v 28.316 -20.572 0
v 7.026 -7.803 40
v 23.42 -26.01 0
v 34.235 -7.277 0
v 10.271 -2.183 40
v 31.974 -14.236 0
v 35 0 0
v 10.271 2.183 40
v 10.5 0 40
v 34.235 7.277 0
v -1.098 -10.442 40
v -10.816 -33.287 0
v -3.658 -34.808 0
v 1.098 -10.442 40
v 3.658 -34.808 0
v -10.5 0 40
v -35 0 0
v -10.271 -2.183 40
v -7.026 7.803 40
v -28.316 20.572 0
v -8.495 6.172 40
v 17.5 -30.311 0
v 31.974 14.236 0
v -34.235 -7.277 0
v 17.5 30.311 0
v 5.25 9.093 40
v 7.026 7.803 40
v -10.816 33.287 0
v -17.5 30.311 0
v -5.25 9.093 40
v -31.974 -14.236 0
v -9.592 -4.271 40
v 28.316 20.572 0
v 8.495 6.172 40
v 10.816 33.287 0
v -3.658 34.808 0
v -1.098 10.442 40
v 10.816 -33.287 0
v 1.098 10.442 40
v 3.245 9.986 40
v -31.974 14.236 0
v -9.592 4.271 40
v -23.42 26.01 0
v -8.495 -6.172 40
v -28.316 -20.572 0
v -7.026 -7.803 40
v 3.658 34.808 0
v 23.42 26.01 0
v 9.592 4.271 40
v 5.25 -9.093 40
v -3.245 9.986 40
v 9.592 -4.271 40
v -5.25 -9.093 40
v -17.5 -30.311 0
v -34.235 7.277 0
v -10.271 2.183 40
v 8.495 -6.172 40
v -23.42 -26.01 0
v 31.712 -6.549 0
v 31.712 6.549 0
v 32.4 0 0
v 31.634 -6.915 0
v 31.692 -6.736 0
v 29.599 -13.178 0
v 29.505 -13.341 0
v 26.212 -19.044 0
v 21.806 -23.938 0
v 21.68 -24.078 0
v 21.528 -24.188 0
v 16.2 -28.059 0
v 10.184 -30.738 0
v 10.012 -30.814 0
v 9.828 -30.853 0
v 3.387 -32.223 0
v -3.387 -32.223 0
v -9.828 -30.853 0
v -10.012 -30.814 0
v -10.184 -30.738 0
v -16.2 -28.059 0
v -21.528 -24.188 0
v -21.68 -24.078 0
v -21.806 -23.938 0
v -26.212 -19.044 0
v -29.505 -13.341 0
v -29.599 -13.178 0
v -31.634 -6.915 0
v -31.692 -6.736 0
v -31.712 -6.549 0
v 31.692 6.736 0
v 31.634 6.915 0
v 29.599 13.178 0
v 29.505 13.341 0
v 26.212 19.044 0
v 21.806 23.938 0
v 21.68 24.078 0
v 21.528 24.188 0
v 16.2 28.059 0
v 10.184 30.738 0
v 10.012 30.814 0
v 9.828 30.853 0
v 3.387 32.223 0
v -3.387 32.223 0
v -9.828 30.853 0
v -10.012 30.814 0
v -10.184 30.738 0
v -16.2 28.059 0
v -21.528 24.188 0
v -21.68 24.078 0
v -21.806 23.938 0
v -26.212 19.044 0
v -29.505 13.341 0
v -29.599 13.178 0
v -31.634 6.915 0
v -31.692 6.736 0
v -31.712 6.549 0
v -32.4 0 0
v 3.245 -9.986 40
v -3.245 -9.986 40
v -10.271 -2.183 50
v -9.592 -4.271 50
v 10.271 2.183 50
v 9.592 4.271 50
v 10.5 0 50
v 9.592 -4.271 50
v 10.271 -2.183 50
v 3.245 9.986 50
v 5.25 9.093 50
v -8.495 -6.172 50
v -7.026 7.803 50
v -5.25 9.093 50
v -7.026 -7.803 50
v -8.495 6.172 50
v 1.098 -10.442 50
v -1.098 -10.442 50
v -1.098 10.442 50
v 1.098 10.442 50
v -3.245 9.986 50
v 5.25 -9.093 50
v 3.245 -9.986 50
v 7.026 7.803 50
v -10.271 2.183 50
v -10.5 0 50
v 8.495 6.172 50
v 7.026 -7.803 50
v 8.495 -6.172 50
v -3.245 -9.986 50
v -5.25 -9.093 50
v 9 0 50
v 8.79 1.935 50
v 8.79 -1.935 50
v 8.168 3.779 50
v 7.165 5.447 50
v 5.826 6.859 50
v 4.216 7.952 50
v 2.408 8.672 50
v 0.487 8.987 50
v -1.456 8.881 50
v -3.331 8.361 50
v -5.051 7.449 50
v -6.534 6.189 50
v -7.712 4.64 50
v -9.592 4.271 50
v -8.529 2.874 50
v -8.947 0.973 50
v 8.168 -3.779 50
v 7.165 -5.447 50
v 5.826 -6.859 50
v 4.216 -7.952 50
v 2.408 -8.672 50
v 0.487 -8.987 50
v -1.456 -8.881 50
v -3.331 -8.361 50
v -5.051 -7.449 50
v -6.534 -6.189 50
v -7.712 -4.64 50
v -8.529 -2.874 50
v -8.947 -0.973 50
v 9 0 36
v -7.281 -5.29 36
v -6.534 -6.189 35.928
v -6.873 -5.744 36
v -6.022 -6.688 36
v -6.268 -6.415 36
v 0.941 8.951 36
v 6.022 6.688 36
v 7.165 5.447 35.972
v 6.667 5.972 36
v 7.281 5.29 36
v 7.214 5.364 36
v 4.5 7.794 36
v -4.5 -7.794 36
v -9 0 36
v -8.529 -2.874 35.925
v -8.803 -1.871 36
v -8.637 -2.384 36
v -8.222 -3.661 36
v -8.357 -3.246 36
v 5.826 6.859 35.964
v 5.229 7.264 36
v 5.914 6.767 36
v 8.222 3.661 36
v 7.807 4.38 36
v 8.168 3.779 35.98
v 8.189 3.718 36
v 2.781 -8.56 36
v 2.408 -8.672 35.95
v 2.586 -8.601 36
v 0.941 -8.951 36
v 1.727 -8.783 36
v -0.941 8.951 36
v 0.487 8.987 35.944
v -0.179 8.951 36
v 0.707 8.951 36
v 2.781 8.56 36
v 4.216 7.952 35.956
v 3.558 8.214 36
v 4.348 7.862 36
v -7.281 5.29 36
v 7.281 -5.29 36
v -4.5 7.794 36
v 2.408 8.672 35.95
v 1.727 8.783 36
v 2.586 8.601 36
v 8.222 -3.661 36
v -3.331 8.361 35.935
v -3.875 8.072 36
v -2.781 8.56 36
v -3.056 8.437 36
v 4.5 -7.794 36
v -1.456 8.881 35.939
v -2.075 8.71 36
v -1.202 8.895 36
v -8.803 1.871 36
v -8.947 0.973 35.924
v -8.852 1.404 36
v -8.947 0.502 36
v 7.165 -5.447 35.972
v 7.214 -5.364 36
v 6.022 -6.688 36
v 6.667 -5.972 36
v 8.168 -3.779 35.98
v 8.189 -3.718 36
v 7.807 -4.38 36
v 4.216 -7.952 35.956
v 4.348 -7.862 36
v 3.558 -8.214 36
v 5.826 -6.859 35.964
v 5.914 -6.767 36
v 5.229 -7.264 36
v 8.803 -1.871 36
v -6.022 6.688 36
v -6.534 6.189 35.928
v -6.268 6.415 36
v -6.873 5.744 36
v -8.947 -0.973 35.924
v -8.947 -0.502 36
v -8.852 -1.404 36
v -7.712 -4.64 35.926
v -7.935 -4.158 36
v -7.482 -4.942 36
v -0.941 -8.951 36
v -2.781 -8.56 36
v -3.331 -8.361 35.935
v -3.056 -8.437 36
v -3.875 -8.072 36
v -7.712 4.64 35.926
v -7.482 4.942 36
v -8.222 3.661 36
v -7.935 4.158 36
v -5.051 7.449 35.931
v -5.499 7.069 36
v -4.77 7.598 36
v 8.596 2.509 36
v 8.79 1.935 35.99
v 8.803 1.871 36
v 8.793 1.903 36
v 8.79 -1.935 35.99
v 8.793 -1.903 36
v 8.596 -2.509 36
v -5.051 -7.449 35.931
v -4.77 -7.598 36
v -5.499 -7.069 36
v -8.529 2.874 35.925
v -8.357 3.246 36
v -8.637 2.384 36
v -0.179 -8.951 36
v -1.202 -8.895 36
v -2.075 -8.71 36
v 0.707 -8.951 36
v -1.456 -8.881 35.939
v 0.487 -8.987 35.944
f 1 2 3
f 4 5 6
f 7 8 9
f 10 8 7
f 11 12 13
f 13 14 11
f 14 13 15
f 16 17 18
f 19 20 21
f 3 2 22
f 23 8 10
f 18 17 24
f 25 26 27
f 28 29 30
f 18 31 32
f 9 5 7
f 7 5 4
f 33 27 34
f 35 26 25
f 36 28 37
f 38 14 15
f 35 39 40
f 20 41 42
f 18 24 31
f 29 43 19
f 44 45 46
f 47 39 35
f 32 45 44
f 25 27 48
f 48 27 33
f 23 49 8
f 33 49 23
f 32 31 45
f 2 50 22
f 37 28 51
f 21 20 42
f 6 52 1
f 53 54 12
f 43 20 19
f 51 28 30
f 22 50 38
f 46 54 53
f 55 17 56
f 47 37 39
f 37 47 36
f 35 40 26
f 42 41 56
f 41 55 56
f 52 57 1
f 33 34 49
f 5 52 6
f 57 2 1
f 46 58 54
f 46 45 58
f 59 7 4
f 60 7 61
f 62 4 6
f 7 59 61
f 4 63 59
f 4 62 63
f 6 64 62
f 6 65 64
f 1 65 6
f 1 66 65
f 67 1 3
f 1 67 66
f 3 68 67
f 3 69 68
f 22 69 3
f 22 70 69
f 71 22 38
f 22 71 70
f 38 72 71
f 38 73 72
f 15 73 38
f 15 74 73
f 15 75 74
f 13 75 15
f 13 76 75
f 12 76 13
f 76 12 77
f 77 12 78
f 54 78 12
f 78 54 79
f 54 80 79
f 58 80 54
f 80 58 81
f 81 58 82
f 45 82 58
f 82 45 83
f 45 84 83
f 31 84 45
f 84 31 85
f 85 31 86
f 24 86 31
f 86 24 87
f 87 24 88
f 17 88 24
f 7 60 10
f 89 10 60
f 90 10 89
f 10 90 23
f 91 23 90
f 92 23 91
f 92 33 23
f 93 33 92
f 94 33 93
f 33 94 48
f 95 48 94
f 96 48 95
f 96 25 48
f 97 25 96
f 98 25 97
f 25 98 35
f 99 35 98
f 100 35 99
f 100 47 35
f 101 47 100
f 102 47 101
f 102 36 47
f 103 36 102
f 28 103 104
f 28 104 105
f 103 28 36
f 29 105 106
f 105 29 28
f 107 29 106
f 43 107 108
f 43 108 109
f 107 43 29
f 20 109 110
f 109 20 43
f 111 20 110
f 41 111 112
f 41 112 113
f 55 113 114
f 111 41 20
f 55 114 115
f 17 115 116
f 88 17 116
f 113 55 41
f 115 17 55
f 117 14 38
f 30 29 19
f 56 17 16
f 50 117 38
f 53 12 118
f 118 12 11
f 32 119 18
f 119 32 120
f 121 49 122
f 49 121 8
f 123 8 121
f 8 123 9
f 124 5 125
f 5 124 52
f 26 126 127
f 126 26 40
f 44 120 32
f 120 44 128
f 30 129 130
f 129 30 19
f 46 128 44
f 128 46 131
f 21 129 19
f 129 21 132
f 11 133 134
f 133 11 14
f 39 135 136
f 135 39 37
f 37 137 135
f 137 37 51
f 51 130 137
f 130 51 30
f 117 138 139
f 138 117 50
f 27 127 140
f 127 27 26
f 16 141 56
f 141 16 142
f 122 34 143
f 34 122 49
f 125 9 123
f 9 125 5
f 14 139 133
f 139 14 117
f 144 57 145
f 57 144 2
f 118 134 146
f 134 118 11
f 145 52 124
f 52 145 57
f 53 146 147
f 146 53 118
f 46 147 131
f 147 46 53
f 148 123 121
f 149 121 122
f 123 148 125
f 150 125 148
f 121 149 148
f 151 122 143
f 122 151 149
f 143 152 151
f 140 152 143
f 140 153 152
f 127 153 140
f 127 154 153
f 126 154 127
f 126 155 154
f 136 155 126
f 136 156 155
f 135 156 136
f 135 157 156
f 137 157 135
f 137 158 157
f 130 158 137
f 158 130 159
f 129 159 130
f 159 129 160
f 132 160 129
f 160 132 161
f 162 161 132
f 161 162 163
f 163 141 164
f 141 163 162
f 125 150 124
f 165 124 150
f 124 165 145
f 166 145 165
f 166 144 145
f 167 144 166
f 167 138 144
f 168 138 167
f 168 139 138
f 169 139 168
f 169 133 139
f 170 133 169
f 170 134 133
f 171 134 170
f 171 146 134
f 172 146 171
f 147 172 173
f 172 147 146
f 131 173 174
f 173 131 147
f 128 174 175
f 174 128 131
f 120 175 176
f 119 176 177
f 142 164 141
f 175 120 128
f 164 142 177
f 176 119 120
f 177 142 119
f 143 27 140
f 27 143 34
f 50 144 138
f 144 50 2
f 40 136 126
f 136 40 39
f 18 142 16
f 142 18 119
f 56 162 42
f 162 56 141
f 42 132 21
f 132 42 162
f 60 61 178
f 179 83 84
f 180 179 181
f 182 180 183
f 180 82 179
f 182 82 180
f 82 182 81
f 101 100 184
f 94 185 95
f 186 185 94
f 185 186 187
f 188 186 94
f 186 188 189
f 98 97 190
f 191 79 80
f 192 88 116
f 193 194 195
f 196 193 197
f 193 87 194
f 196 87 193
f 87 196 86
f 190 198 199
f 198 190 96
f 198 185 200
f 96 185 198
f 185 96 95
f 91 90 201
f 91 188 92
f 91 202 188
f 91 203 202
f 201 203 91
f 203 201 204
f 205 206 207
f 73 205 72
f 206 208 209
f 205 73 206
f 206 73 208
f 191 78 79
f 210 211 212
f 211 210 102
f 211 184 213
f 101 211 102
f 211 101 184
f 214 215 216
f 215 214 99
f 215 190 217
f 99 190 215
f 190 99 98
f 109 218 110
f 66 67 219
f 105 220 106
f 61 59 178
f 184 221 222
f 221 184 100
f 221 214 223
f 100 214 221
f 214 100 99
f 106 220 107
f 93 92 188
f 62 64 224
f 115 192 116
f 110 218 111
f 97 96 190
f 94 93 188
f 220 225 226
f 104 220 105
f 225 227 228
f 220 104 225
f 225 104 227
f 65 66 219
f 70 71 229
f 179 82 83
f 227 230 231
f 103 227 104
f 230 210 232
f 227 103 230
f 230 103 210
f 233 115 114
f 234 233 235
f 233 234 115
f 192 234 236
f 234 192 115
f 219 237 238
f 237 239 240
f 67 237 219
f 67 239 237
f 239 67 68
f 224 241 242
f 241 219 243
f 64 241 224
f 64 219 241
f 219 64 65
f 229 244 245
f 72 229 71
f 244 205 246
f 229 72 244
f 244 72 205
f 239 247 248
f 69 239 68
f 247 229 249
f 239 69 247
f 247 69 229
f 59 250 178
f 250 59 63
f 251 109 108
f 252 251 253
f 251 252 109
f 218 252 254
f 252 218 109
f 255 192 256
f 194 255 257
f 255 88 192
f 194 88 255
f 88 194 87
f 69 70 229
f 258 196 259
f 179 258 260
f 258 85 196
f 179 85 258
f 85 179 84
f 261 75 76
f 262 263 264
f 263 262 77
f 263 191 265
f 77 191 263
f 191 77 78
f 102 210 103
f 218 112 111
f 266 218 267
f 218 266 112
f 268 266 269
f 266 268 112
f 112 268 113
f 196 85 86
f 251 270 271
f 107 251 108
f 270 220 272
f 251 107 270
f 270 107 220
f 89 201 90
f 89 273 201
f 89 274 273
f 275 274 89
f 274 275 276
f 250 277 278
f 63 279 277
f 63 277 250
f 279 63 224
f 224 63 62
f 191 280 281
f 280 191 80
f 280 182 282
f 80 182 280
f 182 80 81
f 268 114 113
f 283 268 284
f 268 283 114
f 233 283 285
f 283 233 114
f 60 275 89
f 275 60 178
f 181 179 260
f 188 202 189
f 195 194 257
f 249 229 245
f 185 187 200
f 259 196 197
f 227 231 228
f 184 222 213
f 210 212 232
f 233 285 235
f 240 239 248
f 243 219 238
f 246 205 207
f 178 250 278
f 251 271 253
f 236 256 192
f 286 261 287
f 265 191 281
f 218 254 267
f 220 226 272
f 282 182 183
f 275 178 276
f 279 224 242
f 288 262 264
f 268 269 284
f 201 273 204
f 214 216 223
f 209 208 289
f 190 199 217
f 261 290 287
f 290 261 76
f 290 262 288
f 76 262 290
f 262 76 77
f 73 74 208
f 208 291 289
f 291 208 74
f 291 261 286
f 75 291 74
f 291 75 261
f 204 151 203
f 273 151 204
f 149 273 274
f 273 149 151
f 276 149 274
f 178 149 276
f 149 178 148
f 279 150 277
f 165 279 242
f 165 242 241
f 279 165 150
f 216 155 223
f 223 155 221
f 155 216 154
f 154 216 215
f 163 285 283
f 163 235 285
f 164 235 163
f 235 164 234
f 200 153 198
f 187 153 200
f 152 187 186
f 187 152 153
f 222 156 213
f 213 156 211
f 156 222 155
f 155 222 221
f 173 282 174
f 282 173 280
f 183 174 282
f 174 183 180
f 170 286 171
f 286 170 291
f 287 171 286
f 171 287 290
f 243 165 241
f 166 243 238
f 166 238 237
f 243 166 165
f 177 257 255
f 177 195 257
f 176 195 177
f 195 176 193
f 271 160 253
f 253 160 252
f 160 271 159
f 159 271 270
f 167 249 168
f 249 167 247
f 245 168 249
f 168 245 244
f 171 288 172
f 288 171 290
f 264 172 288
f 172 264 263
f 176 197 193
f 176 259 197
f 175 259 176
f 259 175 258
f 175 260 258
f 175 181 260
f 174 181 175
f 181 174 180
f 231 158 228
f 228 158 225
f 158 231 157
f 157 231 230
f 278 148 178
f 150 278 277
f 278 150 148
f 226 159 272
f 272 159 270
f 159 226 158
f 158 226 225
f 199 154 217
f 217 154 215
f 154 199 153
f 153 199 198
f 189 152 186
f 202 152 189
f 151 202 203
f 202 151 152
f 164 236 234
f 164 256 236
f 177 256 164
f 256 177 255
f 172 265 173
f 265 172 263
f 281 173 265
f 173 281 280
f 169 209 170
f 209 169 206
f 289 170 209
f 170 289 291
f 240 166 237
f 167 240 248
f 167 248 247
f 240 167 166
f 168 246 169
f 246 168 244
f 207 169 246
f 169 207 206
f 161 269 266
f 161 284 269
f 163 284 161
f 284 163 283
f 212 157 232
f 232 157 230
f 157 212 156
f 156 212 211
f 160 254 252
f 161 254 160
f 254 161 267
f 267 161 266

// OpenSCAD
difference() {
	union() {
		cylinder(h=40, d1=70, d2=21);
		translate([0,0,40]) cylinder(h=10, d=21);
	}
	translate([0,0,-4]) cylinder(h=40, d1=70, d2=18);
	cylinder(h=55, d=18);
}
